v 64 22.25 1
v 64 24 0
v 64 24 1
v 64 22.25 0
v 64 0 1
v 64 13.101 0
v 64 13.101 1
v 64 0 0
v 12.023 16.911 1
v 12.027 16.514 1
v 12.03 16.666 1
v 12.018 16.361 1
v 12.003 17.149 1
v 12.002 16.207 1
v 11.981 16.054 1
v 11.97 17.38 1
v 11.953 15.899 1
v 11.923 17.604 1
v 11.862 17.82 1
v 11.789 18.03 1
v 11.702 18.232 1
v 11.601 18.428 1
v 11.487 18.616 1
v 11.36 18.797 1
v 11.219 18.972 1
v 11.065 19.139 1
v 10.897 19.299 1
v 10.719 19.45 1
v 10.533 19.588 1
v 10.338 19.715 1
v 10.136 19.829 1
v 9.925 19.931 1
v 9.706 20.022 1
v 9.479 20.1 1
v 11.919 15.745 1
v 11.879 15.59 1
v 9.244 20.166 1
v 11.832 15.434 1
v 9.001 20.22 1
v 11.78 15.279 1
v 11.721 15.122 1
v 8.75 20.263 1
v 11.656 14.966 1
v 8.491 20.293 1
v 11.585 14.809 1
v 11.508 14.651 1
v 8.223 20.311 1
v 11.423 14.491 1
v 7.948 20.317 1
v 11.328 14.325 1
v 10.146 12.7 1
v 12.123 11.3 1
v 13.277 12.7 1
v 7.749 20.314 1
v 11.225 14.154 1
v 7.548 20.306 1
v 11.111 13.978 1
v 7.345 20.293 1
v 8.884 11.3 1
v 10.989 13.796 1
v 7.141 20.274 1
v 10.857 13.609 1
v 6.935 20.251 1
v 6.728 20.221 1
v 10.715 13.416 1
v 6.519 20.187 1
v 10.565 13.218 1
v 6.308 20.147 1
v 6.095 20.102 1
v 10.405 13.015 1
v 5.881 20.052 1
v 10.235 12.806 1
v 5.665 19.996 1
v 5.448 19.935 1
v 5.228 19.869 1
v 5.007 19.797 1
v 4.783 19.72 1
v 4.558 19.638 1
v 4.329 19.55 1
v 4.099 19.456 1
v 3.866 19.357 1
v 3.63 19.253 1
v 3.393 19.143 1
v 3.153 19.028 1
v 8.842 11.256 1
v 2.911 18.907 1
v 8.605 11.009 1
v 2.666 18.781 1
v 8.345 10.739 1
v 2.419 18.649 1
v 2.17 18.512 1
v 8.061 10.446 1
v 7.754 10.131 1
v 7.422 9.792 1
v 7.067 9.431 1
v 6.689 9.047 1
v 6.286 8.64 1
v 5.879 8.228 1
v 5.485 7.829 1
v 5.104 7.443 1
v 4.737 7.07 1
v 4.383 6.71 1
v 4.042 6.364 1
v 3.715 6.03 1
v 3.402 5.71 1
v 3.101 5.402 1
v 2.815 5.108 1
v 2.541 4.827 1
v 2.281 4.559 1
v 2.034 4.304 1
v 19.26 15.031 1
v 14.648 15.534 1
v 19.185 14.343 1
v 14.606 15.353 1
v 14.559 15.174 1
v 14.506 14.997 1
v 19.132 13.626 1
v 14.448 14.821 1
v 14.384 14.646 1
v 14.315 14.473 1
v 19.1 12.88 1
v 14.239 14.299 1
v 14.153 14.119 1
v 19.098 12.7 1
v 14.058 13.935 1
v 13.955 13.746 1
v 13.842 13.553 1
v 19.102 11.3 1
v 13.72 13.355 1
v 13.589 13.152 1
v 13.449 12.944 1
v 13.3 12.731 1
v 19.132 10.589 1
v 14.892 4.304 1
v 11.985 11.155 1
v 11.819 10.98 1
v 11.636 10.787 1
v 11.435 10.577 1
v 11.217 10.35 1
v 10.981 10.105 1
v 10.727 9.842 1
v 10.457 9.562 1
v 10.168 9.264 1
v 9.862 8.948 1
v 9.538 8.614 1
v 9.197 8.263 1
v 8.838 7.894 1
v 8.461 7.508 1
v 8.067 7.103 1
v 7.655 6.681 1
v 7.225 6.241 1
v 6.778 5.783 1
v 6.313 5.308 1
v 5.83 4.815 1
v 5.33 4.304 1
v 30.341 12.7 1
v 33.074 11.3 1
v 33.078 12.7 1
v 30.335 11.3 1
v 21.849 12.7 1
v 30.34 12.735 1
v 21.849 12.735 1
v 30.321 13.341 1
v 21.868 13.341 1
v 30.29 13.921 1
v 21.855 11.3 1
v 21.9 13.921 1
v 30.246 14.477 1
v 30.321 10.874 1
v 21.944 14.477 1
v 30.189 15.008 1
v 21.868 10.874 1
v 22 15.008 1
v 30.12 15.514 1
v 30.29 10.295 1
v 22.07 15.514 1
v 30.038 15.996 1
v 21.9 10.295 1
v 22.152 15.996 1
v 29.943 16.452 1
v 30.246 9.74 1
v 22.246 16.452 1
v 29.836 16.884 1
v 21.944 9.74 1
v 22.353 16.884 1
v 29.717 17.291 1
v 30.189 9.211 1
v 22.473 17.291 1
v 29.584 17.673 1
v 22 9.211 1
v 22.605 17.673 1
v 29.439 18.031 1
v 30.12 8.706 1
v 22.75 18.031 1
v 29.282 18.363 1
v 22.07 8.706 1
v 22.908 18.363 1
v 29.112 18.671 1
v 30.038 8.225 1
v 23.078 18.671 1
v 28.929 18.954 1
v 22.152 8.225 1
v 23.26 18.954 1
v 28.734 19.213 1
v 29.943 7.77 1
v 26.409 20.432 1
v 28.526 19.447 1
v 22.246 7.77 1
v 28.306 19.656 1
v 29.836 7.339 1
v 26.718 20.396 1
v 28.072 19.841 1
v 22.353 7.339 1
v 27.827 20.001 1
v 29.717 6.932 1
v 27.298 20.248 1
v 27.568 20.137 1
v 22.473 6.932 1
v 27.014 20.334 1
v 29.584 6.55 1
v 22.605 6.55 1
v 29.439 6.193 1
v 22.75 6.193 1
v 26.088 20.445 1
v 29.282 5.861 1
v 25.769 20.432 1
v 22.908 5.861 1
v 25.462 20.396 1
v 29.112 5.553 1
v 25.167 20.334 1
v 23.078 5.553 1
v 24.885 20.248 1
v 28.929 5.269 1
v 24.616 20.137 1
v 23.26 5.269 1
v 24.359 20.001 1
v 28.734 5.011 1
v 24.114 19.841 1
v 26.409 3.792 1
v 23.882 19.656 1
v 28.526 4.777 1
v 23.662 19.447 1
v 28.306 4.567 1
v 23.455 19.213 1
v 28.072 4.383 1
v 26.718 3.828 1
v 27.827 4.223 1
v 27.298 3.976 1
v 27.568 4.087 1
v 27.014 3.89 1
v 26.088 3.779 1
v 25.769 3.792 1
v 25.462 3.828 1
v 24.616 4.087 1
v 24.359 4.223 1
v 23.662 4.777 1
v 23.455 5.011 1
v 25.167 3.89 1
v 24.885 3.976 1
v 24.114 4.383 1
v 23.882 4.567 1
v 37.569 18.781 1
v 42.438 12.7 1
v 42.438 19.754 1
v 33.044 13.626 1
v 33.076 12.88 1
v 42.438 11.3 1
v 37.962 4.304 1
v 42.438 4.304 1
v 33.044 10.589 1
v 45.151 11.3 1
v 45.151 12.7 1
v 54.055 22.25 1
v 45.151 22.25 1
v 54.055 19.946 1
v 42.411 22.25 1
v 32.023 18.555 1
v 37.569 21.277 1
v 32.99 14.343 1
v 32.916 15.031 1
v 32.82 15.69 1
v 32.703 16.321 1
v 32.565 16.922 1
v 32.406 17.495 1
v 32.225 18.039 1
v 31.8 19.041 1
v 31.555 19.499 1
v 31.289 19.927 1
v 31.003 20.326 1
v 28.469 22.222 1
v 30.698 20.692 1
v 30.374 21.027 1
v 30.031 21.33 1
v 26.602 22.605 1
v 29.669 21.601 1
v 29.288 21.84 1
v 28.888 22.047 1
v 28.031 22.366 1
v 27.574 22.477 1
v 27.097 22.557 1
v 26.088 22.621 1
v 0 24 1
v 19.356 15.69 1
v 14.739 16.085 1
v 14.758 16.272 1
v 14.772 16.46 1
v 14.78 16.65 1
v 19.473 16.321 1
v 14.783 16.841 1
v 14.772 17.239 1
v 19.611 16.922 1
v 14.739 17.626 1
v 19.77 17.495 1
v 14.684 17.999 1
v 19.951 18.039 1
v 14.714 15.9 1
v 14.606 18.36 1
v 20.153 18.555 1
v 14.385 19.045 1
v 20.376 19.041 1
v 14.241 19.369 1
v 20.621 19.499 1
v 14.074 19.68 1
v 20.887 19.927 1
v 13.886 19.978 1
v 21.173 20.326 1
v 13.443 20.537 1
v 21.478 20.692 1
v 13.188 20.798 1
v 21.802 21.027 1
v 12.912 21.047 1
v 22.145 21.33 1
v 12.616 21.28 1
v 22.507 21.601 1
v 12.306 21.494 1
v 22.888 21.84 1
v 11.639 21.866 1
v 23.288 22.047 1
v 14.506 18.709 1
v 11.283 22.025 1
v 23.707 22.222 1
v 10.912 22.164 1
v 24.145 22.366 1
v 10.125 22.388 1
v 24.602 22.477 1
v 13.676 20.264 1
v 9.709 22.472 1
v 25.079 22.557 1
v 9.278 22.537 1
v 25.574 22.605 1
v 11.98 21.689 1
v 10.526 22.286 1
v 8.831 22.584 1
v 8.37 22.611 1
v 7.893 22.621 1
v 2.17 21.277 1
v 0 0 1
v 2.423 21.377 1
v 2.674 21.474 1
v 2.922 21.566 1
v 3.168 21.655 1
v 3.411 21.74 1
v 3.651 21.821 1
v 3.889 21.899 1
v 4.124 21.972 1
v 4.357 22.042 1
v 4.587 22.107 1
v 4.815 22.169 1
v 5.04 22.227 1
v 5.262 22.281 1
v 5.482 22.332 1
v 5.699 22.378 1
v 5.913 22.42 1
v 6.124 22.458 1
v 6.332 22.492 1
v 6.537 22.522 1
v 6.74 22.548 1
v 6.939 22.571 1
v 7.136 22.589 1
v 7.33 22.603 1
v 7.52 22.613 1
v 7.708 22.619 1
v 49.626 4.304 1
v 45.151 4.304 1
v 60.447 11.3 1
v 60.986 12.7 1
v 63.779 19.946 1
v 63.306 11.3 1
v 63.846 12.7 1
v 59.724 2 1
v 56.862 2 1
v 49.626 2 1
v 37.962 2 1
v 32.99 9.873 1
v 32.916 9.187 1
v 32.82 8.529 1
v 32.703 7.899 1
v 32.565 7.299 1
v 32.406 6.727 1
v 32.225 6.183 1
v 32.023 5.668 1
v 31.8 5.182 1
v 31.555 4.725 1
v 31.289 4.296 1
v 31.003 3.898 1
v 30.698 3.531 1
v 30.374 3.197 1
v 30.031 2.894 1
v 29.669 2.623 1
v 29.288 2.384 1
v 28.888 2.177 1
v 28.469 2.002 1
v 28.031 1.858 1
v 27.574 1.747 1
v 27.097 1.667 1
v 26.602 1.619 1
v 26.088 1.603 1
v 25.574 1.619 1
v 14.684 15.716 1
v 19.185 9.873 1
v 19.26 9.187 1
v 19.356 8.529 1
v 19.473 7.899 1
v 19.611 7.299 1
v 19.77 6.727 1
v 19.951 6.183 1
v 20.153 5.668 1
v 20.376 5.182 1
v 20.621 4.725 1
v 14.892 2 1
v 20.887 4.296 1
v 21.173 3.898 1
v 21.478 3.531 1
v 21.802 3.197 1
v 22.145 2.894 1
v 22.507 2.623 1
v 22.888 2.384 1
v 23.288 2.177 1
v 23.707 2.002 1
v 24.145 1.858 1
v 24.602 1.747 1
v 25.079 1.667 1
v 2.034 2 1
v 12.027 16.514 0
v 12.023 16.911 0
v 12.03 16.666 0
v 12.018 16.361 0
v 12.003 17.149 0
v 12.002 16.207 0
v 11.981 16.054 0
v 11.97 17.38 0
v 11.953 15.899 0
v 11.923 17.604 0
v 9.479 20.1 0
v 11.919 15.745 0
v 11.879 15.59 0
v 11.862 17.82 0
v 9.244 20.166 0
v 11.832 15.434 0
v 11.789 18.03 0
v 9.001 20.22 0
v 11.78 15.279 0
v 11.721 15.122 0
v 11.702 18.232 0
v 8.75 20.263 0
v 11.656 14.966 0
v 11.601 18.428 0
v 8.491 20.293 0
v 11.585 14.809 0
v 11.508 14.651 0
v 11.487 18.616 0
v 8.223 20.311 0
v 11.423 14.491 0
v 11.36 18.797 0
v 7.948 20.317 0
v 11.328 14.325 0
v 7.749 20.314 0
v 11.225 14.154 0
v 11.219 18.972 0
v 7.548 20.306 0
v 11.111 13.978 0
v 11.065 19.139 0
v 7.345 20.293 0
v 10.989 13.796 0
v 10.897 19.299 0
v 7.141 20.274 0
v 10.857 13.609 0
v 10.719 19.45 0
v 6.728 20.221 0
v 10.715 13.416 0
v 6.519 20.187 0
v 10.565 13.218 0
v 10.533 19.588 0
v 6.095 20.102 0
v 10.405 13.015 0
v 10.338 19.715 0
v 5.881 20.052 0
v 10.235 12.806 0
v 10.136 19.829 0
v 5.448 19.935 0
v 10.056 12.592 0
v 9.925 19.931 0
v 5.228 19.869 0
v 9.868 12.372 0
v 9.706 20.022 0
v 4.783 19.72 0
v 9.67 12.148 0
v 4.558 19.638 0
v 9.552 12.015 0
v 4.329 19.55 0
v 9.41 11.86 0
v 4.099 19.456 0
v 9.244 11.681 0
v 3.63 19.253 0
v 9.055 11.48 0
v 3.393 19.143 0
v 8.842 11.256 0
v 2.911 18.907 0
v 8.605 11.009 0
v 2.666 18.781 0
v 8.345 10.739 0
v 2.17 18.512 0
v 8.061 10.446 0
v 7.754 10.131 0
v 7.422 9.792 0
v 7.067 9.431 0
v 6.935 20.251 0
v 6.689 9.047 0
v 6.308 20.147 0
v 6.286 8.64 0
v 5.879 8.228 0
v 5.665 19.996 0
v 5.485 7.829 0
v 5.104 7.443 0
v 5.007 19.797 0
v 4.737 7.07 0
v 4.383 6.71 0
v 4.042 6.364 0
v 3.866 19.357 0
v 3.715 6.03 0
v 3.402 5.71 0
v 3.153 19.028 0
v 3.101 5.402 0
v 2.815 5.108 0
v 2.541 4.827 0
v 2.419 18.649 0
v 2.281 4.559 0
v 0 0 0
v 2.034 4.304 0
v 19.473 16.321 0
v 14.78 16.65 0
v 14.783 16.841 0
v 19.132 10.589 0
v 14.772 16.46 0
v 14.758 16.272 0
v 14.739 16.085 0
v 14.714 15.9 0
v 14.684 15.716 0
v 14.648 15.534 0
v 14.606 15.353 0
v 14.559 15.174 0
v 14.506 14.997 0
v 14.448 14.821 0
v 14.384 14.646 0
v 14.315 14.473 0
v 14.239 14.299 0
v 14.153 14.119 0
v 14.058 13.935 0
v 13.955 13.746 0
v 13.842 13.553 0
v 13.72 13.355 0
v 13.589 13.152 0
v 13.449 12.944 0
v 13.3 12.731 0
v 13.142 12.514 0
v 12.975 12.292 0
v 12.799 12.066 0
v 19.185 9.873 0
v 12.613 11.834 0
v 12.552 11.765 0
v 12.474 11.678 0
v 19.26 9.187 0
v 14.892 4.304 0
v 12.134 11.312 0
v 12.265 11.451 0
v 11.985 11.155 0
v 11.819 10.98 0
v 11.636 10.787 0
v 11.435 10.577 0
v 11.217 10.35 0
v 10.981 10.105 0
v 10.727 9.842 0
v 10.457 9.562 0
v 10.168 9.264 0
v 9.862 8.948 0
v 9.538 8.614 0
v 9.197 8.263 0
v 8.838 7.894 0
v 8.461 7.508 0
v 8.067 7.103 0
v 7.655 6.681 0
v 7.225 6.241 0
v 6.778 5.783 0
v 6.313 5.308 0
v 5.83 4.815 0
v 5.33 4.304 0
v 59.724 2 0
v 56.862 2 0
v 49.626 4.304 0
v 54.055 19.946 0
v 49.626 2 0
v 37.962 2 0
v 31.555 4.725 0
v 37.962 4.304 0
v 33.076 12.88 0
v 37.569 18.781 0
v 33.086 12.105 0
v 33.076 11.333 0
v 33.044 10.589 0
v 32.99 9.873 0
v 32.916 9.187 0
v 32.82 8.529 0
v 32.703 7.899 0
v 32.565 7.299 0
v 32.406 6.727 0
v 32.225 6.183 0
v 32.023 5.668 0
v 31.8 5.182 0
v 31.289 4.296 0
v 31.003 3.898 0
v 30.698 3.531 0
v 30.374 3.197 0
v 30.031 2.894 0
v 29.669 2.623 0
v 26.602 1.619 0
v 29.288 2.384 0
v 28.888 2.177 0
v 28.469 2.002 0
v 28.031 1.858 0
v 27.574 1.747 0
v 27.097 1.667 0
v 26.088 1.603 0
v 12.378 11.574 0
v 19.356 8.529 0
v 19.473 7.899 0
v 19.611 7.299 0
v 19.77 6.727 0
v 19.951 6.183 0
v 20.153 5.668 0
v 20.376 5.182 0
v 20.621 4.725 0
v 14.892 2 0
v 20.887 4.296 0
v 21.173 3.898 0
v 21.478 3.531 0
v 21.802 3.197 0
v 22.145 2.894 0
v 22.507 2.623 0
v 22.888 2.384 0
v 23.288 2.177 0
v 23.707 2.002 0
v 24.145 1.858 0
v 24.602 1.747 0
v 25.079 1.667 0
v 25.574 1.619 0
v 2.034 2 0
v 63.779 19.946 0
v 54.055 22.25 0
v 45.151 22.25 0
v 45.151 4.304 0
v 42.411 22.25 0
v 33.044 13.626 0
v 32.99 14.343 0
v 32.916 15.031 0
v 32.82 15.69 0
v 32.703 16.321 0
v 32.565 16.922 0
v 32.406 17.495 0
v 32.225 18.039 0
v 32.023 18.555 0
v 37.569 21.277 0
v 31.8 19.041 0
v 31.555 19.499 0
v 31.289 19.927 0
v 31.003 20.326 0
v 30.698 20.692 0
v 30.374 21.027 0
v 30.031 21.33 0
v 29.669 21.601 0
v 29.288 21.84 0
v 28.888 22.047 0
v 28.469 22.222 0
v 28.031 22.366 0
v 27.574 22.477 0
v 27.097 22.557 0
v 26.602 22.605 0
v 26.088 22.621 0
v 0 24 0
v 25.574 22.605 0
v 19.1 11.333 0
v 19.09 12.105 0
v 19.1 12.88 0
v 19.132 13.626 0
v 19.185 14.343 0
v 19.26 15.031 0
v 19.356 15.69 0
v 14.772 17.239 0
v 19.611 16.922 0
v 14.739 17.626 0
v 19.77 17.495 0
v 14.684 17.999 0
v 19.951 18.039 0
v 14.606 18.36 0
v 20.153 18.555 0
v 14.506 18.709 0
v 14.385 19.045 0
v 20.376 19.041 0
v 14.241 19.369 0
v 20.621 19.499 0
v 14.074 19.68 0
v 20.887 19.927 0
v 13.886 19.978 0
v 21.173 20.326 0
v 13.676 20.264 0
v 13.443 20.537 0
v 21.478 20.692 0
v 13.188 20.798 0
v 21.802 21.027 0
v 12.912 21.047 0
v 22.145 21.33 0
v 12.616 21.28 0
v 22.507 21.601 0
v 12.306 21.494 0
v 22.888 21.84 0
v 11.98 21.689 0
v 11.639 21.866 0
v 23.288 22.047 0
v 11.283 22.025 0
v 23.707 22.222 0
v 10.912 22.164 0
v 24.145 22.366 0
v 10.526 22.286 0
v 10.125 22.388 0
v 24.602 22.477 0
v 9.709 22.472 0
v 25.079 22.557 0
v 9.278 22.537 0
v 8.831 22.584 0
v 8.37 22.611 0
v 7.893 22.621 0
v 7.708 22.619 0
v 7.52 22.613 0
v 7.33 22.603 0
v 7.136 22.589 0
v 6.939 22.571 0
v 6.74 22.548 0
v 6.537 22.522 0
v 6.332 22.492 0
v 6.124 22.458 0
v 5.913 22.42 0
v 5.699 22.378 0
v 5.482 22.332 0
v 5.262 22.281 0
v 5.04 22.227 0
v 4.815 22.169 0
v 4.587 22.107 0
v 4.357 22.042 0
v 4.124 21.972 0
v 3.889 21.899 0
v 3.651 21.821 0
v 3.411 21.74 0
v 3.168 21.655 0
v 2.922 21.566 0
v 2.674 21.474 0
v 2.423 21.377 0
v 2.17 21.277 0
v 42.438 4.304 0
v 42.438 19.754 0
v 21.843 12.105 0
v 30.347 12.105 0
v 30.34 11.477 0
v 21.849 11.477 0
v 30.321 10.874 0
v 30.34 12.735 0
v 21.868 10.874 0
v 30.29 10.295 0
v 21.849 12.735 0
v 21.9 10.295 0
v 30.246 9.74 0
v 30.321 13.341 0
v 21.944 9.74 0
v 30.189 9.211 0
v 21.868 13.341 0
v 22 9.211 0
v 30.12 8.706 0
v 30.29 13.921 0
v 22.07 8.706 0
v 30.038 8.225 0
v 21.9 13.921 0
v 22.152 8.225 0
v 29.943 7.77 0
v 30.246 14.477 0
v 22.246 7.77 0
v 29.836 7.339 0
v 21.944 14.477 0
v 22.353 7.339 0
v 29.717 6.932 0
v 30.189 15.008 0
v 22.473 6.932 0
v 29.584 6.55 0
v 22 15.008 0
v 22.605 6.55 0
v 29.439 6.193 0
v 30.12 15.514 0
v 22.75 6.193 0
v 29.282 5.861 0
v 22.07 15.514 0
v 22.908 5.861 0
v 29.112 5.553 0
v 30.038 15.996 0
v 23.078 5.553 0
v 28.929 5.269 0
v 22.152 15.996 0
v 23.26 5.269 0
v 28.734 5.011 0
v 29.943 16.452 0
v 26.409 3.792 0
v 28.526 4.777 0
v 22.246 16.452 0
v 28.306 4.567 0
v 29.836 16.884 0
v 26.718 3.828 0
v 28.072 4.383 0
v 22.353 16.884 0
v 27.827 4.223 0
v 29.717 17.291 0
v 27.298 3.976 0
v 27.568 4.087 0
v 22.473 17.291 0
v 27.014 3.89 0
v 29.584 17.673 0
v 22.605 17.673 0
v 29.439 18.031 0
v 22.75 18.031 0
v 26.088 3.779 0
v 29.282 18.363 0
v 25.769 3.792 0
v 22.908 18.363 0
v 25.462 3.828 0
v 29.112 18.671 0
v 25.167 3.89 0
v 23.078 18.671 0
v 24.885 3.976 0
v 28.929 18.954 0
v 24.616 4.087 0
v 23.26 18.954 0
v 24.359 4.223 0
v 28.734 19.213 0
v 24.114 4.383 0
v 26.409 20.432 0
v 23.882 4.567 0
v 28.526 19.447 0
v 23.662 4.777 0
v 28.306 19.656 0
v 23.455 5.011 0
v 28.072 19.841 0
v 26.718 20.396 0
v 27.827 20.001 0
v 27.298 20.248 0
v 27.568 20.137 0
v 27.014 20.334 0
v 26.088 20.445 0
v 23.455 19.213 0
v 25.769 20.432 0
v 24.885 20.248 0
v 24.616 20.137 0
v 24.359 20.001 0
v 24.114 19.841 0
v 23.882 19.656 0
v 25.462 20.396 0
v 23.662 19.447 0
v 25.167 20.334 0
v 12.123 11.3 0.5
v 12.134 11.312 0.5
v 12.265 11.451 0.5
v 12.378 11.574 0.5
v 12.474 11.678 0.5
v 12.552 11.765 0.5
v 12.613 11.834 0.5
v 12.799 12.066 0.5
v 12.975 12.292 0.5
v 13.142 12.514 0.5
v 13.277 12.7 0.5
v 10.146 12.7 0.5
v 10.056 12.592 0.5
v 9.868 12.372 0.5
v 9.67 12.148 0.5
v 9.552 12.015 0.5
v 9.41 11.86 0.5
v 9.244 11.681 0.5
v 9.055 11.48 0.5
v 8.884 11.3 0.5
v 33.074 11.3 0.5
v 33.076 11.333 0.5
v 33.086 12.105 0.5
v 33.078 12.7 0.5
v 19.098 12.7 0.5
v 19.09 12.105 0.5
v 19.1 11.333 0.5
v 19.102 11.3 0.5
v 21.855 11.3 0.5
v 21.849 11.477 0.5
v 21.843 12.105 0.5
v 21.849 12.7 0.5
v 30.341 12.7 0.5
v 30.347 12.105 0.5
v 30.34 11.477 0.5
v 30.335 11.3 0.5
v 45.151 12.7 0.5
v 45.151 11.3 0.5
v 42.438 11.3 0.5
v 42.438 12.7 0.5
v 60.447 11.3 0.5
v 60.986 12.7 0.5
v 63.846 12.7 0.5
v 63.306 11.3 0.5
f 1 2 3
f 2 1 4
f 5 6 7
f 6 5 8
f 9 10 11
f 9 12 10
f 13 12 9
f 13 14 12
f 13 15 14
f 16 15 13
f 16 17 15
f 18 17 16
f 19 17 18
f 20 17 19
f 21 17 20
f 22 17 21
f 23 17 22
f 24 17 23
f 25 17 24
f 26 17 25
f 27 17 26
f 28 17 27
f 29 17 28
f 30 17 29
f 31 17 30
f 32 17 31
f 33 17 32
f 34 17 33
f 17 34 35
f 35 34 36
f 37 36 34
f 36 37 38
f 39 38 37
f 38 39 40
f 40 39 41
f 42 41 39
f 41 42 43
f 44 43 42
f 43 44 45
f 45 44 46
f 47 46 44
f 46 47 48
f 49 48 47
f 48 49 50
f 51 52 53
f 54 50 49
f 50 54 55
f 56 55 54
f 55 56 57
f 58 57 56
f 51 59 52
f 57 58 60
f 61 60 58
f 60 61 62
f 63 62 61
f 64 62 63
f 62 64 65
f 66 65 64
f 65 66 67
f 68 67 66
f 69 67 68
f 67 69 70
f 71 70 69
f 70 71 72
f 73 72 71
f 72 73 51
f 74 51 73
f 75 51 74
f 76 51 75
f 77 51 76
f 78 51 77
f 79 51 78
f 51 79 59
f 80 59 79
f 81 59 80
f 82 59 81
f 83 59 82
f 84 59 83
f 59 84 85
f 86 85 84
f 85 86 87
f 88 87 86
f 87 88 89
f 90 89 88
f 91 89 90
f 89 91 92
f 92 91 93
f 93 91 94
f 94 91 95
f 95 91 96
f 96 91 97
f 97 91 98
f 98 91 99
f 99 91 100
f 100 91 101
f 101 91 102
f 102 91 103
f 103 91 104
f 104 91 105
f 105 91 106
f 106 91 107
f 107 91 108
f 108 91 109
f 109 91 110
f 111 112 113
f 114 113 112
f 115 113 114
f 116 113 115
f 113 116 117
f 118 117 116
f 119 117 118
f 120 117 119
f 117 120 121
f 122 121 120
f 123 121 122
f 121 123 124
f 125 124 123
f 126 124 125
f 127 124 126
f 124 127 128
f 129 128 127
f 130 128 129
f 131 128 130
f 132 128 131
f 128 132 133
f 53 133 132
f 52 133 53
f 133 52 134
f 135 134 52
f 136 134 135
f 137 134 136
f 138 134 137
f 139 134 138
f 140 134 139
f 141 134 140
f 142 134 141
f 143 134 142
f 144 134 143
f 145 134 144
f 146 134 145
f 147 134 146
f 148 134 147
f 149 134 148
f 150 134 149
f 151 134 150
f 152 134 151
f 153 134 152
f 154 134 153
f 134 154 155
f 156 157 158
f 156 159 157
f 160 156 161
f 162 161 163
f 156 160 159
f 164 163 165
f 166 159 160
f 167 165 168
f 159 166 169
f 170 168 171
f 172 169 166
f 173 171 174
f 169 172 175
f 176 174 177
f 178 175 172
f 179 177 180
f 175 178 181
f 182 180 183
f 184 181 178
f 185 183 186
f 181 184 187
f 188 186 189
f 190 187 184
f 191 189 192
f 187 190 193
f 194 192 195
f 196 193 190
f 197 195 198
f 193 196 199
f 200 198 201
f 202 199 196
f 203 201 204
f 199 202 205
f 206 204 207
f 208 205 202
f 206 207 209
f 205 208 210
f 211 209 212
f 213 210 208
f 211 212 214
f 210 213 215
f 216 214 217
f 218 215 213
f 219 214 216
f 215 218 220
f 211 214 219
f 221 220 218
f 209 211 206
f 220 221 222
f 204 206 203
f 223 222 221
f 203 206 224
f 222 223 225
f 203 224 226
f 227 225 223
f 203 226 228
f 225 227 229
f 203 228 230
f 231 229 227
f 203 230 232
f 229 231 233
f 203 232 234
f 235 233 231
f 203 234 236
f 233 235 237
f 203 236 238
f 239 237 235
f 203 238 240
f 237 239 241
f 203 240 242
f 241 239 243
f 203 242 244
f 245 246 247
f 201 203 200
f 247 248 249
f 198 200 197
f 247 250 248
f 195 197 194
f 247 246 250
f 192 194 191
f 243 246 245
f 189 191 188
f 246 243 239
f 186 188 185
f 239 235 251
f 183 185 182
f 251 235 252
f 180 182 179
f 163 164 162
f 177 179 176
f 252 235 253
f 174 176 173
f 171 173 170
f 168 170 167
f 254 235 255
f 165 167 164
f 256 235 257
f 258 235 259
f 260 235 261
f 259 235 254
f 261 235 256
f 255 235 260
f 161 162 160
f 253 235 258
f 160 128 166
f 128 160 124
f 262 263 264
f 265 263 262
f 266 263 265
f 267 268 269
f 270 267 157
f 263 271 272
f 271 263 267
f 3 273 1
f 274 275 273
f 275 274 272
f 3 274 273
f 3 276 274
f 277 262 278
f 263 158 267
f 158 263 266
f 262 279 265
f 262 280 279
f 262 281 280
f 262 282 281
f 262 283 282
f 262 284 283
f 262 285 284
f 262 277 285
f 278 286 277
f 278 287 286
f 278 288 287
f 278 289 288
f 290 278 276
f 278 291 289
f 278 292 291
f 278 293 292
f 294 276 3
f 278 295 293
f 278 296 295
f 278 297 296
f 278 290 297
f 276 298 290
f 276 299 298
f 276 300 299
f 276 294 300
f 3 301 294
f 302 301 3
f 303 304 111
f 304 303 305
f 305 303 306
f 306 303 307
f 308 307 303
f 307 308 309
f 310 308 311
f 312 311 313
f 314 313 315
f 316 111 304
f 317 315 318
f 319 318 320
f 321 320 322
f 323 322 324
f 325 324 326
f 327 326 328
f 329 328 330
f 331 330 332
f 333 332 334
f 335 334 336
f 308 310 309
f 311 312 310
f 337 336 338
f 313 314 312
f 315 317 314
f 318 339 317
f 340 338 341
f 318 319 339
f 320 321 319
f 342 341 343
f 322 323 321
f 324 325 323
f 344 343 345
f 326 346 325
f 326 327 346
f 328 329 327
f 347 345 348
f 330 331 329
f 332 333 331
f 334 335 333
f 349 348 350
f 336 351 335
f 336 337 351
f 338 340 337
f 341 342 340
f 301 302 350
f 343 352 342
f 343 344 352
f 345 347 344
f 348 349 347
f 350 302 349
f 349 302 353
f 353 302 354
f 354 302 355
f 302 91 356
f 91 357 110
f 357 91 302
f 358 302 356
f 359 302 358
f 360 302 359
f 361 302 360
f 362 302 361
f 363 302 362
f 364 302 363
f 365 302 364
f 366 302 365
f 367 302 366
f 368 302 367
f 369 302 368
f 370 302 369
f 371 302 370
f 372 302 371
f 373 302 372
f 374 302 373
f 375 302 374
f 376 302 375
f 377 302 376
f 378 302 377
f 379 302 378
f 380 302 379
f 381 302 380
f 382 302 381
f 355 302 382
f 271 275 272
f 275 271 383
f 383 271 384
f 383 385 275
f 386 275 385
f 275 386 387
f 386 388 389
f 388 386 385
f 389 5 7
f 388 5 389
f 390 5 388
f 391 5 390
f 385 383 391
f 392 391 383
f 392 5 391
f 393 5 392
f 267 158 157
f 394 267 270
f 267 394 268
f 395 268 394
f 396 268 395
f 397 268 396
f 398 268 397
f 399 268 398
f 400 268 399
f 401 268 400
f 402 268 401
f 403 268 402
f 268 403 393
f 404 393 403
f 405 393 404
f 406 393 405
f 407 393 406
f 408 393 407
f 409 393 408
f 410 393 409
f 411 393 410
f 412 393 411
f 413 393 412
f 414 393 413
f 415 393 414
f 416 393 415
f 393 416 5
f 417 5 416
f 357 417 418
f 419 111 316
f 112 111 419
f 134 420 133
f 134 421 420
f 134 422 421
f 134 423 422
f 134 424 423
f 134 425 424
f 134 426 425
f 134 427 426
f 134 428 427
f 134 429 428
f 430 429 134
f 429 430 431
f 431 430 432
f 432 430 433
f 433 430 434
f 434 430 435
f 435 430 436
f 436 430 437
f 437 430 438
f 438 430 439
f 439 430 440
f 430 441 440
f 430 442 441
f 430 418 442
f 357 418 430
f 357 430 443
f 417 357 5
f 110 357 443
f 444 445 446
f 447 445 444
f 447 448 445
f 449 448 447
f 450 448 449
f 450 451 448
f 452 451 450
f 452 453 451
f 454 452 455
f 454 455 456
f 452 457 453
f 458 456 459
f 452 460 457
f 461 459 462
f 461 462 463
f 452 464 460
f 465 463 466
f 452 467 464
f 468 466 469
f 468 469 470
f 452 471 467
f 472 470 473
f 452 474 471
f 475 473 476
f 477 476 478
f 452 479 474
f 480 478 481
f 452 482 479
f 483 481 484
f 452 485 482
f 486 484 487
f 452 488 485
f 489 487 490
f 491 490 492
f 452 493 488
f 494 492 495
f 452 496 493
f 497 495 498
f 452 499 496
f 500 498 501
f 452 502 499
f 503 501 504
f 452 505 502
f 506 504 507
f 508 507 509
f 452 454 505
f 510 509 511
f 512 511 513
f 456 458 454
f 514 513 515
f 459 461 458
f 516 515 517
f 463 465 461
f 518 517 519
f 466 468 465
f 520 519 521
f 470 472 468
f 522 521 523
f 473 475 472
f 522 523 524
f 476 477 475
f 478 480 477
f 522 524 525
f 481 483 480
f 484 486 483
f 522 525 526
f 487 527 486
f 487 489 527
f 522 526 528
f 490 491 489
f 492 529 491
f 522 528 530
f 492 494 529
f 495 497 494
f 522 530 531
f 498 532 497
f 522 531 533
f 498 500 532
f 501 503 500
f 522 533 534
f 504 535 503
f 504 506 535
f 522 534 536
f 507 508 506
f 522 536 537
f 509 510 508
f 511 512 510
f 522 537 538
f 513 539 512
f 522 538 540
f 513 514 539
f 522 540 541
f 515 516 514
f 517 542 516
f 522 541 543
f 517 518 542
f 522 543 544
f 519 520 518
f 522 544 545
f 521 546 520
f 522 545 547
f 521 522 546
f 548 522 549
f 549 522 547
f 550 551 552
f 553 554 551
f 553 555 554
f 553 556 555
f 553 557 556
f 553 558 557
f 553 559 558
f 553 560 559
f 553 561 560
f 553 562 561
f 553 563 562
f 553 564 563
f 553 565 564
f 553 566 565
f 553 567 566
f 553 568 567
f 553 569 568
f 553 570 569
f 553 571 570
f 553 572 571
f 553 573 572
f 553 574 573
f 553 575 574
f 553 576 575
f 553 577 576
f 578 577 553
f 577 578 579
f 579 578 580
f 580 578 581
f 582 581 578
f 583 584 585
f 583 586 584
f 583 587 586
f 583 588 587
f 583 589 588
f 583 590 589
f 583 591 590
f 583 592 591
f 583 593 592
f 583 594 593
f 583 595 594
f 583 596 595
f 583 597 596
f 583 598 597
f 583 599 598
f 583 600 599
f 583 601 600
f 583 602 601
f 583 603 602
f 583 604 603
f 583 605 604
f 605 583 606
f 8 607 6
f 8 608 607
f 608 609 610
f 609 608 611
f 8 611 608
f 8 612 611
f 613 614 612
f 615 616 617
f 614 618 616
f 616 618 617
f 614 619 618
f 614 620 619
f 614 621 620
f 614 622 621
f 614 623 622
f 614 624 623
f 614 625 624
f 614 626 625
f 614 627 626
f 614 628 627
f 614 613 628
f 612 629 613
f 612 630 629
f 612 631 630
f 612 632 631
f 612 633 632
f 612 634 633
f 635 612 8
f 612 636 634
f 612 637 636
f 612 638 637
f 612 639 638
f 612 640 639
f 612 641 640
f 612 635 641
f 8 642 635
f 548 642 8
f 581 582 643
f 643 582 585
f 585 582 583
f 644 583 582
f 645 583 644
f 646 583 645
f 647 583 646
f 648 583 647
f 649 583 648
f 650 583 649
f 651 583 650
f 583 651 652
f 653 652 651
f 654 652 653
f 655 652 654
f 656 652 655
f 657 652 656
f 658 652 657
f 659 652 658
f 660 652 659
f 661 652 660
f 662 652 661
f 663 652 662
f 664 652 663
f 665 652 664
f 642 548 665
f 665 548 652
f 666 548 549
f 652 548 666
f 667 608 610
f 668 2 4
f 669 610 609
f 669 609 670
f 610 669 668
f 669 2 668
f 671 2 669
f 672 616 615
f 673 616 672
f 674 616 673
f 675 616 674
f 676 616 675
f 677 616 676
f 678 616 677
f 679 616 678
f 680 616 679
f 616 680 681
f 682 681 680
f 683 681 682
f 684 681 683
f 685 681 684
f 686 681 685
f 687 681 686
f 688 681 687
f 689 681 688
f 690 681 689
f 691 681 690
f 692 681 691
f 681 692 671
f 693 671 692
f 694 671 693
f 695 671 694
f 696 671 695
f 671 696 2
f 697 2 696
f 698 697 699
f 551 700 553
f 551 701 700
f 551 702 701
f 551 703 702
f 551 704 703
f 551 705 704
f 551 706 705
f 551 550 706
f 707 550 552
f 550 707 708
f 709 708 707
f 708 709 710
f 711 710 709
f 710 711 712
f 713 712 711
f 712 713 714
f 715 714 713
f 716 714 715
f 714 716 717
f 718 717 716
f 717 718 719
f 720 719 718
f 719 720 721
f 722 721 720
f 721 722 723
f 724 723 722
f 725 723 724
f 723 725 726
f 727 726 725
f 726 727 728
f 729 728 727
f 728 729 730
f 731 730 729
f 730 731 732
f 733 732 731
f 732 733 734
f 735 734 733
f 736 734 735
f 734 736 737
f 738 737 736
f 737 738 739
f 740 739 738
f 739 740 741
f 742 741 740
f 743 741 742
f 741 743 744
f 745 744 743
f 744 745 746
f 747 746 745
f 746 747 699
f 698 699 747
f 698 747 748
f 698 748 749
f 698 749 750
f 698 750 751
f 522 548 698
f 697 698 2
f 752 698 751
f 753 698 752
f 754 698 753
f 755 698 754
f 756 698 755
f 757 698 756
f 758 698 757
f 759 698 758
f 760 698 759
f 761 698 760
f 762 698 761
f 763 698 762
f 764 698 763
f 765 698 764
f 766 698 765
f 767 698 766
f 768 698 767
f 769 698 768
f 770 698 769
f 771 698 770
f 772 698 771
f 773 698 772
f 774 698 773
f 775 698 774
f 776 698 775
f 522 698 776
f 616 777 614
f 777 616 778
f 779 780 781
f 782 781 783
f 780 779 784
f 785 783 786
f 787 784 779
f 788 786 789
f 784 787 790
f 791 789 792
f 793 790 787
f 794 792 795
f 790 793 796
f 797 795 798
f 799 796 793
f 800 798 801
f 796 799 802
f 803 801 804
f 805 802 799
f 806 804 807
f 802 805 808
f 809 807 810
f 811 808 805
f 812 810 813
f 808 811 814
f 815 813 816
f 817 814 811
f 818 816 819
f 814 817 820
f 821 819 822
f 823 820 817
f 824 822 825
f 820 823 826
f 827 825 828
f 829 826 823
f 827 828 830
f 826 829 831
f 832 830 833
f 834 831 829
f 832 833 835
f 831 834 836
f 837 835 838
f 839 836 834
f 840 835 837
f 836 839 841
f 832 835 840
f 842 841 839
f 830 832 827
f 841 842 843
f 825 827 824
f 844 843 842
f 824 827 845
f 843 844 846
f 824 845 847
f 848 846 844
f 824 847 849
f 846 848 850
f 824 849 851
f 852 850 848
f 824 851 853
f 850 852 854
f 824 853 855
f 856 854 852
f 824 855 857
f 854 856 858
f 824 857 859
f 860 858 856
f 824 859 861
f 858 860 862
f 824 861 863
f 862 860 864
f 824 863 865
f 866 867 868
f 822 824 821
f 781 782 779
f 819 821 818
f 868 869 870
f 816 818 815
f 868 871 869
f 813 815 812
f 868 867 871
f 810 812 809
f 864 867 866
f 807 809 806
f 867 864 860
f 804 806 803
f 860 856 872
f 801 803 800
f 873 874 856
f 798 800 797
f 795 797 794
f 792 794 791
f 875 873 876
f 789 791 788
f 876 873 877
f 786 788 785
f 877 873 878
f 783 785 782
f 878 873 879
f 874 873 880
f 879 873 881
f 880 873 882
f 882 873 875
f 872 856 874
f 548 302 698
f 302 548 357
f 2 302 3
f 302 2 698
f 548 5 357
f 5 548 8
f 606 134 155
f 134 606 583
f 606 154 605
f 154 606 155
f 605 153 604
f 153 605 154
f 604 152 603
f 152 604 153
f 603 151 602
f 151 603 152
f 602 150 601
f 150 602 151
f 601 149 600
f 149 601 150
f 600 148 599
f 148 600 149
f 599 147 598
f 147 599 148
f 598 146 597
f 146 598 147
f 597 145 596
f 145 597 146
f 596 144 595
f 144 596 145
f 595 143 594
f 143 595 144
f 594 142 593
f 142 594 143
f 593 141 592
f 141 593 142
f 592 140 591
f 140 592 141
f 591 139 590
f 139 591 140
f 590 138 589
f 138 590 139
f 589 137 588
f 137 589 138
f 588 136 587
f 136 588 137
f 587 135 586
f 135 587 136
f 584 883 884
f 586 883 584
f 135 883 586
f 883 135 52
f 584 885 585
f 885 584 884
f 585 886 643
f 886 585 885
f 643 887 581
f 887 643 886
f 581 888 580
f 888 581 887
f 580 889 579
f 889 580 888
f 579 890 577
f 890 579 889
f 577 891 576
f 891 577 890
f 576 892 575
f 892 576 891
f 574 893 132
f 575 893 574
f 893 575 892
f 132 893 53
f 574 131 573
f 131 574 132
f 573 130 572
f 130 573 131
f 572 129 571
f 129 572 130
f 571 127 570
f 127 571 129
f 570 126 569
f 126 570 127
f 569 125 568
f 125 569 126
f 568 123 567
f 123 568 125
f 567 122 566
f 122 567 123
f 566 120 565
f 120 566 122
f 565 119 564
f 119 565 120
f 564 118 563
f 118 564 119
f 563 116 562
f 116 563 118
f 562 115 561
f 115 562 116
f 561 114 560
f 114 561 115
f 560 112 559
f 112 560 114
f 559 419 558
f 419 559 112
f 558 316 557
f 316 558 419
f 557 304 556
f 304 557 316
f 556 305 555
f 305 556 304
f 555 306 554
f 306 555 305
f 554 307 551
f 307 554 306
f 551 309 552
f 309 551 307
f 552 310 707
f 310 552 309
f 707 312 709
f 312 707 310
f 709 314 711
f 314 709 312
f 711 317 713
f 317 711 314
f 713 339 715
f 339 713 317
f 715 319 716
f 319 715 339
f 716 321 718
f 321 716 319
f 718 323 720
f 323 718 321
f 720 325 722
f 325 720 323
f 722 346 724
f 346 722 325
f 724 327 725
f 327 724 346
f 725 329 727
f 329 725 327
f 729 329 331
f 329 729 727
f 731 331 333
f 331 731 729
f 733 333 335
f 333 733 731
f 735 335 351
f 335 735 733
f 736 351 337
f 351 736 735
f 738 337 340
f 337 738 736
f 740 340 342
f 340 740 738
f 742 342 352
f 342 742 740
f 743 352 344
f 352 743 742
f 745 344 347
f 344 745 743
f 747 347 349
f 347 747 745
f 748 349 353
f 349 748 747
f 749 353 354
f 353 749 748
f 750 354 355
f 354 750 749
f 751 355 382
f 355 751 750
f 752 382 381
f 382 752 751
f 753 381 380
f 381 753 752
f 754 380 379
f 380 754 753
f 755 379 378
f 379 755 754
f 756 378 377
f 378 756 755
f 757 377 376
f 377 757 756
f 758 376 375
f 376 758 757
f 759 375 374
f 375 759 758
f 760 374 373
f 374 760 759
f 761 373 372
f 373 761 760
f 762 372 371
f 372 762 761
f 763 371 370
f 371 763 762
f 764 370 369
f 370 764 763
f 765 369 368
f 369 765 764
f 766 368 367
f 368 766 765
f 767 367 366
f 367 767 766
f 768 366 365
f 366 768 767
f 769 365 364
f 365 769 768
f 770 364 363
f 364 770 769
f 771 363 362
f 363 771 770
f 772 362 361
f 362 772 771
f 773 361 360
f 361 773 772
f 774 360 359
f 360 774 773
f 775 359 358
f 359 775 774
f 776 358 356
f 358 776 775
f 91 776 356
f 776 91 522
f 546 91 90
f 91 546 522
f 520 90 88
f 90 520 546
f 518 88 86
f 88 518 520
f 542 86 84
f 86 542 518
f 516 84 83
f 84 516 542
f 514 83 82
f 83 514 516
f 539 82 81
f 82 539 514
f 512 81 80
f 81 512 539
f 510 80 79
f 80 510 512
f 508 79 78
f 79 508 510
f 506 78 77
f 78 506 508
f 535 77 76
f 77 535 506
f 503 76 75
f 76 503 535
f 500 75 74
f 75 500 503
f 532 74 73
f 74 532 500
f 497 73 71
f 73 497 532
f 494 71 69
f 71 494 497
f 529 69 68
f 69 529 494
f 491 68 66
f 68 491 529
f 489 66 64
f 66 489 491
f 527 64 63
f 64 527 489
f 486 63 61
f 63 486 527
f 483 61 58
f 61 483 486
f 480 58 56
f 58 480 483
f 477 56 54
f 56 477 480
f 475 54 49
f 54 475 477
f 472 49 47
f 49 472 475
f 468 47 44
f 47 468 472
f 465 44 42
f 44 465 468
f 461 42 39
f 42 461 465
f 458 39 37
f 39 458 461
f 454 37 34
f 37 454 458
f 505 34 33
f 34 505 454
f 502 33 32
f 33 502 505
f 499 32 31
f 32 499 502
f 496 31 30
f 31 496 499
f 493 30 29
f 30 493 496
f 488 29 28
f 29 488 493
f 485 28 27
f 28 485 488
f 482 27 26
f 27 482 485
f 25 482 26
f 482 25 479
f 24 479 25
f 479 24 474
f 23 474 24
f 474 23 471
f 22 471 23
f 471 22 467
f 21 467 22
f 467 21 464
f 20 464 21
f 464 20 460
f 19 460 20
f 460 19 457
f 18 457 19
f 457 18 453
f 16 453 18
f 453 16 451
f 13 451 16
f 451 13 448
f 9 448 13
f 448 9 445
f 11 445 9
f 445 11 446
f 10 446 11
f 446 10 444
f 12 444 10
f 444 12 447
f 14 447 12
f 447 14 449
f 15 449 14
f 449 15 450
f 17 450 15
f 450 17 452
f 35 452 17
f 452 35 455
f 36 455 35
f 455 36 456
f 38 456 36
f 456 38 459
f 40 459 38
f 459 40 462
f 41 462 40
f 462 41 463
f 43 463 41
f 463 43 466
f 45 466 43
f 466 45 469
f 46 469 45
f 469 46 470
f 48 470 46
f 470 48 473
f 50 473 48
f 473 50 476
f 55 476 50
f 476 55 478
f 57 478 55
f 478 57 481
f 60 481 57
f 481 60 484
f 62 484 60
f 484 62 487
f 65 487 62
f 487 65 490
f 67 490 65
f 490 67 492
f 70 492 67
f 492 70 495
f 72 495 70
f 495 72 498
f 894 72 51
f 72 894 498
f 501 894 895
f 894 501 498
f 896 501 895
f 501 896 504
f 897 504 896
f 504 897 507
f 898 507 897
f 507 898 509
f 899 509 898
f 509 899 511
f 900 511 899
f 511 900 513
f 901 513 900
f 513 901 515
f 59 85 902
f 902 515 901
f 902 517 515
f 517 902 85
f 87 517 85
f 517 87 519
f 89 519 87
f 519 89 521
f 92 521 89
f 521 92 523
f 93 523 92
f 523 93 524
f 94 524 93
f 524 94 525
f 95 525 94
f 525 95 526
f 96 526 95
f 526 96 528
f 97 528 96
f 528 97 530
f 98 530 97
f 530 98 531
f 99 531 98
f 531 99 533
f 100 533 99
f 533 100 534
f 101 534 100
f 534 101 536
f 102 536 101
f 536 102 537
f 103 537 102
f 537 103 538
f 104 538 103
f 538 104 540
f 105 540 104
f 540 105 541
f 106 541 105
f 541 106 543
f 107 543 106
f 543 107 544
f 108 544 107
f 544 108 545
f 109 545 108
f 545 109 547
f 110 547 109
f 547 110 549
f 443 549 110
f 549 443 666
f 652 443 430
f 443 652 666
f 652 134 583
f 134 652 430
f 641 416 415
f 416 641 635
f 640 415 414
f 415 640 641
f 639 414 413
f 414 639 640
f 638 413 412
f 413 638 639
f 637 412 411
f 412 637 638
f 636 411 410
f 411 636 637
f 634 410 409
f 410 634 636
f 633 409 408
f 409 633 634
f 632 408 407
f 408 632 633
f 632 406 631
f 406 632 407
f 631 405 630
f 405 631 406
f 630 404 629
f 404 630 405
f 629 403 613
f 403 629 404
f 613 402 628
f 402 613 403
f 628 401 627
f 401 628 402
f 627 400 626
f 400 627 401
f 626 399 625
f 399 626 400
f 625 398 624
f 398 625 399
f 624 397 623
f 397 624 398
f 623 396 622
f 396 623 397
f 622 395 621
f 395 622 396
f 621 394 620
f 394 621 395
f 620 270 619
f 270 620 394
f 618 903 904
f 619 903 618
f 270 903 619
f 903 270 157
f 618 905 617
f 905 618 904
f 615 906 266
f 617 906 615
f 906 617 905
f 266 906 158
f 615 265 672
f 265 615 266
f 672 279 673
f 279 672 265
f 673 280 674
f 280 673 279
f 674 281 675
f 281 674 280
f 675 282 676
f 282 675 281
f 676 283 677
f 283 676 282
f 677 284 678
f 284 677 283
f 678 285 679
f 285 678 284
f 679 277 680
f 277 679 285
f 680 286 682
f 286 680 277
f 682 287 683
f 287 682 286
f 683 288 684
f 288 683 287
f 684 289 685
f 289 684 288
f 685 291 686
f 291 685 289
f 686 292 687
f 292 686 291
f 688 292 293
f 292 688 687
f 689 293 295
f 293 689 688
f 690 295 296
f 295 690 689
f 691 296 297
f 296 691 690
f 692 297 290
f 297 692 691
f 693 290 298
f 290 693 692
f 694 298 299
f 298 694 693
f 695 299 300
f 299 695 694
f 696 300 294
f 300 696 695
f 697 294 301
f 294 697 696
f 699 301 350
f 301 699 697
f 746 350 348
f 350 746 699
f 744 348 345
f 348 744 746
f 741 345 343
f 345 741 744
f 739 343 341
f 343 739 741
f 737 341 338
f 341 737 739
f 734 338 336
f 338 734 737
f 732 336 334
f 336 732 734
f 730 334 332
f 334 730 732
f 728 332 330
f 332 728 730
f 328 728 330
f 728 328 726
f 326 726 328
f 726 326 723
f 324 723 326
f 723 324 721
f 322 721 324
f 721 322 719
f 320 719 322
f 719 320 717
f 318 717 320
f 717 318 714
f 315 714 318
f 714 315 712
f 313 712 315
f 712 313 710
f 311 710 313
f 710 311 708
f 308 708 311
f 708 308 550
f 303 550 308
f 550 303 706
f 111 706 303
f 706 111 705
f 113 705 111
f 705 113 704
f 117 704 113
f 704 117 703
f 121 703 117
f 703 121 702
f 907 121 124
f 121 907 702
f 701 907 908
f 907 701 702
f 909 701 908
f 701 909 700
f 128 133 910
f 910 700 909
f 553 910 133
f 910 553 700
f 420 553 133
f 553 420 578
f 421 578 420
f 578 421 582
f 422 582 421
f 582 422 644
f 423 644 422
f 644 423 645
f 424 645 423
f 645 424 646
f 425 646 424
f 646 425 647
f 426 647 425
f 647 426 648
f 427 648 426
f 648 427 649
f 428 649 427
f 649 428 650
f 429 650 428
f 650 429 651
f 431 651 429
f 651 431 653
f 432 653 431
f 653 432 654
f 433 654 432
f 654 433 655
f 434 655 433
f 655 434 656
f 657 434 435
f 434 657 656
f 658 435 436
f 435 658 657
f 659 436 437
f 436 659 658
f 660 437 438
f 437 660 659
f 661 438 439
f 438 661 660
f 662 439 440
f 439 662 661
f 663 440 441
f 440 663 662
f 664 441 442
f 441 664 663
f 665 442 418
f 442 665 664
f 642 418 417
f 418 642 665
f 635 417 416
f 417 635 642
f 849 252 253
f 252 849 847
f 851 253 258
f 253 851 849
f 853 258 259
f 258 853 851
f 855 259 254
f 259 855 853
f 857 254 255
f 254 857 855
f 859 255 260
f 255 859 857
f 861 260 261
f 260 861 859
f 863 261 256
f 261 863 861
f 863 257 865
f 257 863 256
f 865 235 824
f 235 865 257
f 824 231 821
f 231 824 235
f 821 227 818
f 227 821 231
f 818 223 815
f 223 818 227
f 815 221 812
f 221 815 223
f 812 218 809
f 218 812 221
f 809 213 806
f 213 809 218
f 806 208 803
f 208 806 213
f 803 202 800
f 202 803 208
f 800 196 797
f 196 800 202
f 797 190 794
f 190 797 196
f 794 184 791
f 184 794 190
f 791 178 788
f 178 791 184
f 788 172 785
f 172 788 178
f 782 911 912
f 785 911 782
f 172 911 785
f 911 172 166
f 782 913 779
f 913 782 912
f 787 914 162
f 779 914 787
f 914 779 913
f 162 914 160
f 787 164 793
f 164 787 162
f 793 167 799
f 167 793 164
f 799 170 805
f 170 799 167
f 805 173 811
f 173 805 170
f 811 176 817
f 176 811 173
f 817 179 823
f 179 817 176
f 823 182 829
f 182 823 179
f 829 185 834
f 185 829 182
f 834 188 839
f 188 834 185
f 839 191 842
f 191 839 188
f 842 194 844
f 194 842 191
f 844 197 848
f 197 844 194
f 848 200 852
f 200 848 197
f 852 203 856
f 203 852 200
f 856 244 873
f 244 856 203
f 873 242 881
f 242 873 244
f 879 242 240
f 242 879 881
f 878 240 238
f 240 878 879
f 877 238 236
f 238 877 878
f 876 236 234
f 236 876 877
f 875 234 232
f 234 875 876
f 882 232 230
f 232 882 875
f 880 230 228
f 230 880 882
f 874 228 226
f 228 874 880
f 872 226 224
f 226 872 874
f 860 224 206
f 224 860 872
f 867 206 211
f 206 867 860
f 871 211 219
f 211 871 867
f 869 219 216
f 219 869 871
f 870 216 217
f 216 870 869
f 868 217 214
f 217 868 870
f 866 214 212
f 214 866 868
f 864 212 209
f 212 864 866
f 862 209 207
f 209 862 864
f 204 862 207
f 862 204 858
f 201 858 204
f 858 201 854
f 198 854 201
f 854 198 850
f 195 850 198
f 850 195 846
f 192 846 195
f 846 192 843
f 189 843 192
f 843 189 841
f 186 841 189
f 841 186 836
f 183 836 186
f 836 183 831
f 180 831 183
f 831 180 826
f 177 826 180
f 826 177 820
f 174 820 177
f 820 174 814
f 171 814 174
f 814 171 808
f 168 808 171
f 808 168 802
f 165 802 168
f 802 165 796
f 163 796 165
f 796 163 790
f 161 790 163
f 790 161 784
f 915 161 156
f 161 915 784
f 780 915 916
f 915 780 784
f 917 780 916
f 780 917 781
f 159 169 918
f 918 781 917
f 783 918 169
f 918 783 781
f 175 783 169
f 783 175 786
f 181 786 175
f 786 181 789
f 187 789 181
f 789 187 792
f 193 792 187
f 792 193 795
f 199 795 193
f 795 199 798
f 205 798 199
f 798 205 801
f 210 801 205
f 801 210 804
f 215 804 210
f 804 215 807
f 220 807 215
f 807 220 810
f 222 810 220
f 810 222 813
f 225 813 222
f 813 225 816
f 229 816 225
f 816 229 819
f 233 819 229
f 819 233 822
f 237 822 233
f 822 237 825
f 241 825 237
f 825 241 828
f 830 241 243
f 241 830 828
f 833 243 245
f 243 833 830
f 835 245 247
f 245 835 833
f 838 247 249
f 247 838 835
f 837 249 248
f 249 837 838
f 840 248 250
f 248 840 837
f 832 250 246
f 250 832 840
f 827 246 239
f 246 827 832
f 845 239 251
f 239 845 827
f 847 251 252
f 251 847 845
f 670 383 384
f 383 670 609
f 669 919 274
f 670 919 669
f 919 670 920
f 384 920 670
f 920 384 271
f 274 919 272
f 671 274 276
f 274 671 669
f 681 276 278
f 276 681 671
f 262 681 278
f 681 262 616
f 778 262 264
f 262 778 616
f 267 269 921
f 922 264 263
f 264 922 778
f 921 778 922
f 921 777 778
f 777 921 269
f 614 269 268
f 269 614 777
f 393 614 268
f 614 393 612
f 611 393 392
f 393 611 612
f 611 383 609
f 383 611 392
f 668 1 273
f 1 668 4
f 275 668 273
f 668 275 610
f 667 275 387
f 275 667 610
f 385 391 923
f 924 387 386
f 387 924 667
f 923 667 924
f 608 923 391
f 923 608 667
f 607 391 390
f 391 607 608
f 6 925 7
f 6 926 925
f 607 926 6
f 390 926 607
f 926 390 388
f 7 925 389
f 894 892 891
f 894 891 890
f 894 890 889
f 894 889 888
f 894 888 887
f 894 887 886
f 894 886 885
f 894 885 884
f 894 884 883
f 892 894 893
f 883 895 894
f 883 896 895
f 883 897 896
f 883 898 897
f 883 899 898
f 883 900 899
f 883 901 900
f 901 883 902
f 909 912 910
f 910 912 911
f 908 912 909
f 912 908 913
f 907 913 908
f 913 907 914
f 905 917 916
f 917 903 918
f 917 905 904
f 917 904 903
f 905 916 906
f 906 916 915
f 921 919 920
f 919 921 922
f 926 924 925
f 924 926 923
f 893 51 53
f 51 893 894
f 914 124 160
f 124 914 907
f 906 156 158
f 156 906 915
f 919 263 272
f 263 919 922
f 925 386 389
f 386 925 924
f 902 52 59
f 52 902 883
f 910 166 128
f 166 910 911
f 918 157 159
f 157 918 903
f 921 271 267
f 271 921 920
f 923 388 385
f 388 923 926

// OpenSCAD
// file: ../lib/common.scad
// Common modules for use across models

epsilon=0.02;

module hollow_cylinder(h,d_inner,d_outer) {
  difference() {
    cylinder(h=h,d=d_outer);
    translate([0,0,-epsilon/2]) {
      cylinder(h=h+epsilon, d=d_inner);
    }
  }
}

module hollow_prism(h, lx_outer, lx_inner, ly_outer, ly_inner) {
  difference() {
    cube([lx_outer, ly_outer, h]);
    translate([(lx_outer-lx_inner)/2,(ly_outer-ly_inner)/2,-epsilon/2]) {
      cube([lx_inner, ly_inner,h+epsilon]);
    }
  }
}

module right_triangle(lx, ly) {
  polygon(points=[[0,0],
                  [lx,0],
                  [0,ly],
                  [0,0]]);
}

// A 2D rectangle with rounded corners
module rounded_rectangle(width, height, radius) {
  r = radius;
  x1 = r;
  y1 = r;
  x2 = width - r;
  y2 = height - r;
  hull() {
    translate([x1, y1, 0]) circle(radius);
    translate([x2, y1, 0]) circle(radius);
    translate([x1, y2, 0]) circle(radius);
    translate([x2, y2, 0]) circle(radius);
  }
}

// 3D rectangle with cylindrical rounded corners. Scale gives an optional flare to the top.
module rounded_prism(width, length, height, radius, scale=1) {
  translate([width/2, length/2]) {
    linear_extrude(height=height, scale=scale) {
      translate([-width/2, -length/2]) {
        rounded_rectangle(width, length, radius);
      }
    }
  }
}

// A squished sphere with the specified radii
module squashed_sphere(h_radius, v_radius) {
  resize([h_radius*2, h_radius*2, v_radius*2]) {
    sphere(r=h_radius);
  }
}

// 3D rectangle with spherical rounded corners
module pillowed_prism(width, length, height, h_radius, v_radius) {
  x1 = h_radius;
  y1 = x1;
  x2 = width - h_radius;
  y2 = length - h_radius;
  hull() {
    translate([x1, y1,  height/2-v_radius]) squashed_sphere(h_radius, v_radius);
    translate([x2, y1,  height/2-v_radius]) squashed_sphere(h_radius, v_radius);
    translate([x1, y2,  height/2-v_radius]) squashed_sphere(h_radius, v_radius);
    translate([x2, y2,  height/2-v_radius]) squashed_sphere(h_radius, v_radius);
    translate([x1, y1, -height/2+v_radius]) squashed_sphere(h_radius, v_radius);
    translate([x2, y1, -height/2+v_radius]) squashed_sphere(h_radius, v_radius);
    translate([x1, y2, -height/2+v_radius]) squashed_sphere(h_radius, v_radius);
    translate([x2, y2, -height/2+v_radius]) squashed_sphere(h_radius, v_radius);
  }
}

// Returns a volume that contains all of the points above or below the
// specified z
module xy(above, below)
{
  d = 10000;
  if (below == undef)
    translate([0,0,above+d/2]) cube([d,d,d] ,center=true);
  else
    translate([0,0,below-d/2]) cube([d,d,d], center=true);
}

// Lays things out in a line with labels
// TODO: Lay them out in a grid instead
module display(w, l=10, padding=2) {
  for (n = [0:2:$children-1]) {
    translate([(w + padding) * n/2, 0, 0]) {
      translate([0, l, 0]) {
        children(n+1);
      }
      color([0,0,0])
        children(n);
    }
  }
}

module quarter_cylinder(r, h) {
  difference() {
    translate([0,0,h/2]) {
      cylinder(r=r, h=h, center=true);
    }
    translate([-r*2-epsilon,-r*2,-epsilon]) {
      cube([r*2,r*4,h*2]);
    }
    translate([-r*2-epsilon,-r*2,-epsilon]) {
      cube([r*4,r*2,h*2]);
    }

  }
}

function bit_test(val, bit) = floor(val / (pow(2,bit))) % 2;

function inches(in) = in * 25.4;
// main file
include <../lib/common.scad>;

$fn = 96;
e=epsilon;

border = 2;
thickness = 1;
size = 20;
words="2017";
length = len(words)*size*0.8;
connector_width = 0.35*4;
font="Baskerville";

union () {
  translate([0,size/2+border-connector_width/2,thickness*0.5]) {
    cube([length, connector_width, thickness*0.5]);
  }
  difference() {
    cube([length, size + 2*border, thickness]);
    translate([0,border,-e]) {
      linear_extrude(height=thickness+2*e) {
        text(text=words, size=size, font=font);
      }
    }
  }
}
